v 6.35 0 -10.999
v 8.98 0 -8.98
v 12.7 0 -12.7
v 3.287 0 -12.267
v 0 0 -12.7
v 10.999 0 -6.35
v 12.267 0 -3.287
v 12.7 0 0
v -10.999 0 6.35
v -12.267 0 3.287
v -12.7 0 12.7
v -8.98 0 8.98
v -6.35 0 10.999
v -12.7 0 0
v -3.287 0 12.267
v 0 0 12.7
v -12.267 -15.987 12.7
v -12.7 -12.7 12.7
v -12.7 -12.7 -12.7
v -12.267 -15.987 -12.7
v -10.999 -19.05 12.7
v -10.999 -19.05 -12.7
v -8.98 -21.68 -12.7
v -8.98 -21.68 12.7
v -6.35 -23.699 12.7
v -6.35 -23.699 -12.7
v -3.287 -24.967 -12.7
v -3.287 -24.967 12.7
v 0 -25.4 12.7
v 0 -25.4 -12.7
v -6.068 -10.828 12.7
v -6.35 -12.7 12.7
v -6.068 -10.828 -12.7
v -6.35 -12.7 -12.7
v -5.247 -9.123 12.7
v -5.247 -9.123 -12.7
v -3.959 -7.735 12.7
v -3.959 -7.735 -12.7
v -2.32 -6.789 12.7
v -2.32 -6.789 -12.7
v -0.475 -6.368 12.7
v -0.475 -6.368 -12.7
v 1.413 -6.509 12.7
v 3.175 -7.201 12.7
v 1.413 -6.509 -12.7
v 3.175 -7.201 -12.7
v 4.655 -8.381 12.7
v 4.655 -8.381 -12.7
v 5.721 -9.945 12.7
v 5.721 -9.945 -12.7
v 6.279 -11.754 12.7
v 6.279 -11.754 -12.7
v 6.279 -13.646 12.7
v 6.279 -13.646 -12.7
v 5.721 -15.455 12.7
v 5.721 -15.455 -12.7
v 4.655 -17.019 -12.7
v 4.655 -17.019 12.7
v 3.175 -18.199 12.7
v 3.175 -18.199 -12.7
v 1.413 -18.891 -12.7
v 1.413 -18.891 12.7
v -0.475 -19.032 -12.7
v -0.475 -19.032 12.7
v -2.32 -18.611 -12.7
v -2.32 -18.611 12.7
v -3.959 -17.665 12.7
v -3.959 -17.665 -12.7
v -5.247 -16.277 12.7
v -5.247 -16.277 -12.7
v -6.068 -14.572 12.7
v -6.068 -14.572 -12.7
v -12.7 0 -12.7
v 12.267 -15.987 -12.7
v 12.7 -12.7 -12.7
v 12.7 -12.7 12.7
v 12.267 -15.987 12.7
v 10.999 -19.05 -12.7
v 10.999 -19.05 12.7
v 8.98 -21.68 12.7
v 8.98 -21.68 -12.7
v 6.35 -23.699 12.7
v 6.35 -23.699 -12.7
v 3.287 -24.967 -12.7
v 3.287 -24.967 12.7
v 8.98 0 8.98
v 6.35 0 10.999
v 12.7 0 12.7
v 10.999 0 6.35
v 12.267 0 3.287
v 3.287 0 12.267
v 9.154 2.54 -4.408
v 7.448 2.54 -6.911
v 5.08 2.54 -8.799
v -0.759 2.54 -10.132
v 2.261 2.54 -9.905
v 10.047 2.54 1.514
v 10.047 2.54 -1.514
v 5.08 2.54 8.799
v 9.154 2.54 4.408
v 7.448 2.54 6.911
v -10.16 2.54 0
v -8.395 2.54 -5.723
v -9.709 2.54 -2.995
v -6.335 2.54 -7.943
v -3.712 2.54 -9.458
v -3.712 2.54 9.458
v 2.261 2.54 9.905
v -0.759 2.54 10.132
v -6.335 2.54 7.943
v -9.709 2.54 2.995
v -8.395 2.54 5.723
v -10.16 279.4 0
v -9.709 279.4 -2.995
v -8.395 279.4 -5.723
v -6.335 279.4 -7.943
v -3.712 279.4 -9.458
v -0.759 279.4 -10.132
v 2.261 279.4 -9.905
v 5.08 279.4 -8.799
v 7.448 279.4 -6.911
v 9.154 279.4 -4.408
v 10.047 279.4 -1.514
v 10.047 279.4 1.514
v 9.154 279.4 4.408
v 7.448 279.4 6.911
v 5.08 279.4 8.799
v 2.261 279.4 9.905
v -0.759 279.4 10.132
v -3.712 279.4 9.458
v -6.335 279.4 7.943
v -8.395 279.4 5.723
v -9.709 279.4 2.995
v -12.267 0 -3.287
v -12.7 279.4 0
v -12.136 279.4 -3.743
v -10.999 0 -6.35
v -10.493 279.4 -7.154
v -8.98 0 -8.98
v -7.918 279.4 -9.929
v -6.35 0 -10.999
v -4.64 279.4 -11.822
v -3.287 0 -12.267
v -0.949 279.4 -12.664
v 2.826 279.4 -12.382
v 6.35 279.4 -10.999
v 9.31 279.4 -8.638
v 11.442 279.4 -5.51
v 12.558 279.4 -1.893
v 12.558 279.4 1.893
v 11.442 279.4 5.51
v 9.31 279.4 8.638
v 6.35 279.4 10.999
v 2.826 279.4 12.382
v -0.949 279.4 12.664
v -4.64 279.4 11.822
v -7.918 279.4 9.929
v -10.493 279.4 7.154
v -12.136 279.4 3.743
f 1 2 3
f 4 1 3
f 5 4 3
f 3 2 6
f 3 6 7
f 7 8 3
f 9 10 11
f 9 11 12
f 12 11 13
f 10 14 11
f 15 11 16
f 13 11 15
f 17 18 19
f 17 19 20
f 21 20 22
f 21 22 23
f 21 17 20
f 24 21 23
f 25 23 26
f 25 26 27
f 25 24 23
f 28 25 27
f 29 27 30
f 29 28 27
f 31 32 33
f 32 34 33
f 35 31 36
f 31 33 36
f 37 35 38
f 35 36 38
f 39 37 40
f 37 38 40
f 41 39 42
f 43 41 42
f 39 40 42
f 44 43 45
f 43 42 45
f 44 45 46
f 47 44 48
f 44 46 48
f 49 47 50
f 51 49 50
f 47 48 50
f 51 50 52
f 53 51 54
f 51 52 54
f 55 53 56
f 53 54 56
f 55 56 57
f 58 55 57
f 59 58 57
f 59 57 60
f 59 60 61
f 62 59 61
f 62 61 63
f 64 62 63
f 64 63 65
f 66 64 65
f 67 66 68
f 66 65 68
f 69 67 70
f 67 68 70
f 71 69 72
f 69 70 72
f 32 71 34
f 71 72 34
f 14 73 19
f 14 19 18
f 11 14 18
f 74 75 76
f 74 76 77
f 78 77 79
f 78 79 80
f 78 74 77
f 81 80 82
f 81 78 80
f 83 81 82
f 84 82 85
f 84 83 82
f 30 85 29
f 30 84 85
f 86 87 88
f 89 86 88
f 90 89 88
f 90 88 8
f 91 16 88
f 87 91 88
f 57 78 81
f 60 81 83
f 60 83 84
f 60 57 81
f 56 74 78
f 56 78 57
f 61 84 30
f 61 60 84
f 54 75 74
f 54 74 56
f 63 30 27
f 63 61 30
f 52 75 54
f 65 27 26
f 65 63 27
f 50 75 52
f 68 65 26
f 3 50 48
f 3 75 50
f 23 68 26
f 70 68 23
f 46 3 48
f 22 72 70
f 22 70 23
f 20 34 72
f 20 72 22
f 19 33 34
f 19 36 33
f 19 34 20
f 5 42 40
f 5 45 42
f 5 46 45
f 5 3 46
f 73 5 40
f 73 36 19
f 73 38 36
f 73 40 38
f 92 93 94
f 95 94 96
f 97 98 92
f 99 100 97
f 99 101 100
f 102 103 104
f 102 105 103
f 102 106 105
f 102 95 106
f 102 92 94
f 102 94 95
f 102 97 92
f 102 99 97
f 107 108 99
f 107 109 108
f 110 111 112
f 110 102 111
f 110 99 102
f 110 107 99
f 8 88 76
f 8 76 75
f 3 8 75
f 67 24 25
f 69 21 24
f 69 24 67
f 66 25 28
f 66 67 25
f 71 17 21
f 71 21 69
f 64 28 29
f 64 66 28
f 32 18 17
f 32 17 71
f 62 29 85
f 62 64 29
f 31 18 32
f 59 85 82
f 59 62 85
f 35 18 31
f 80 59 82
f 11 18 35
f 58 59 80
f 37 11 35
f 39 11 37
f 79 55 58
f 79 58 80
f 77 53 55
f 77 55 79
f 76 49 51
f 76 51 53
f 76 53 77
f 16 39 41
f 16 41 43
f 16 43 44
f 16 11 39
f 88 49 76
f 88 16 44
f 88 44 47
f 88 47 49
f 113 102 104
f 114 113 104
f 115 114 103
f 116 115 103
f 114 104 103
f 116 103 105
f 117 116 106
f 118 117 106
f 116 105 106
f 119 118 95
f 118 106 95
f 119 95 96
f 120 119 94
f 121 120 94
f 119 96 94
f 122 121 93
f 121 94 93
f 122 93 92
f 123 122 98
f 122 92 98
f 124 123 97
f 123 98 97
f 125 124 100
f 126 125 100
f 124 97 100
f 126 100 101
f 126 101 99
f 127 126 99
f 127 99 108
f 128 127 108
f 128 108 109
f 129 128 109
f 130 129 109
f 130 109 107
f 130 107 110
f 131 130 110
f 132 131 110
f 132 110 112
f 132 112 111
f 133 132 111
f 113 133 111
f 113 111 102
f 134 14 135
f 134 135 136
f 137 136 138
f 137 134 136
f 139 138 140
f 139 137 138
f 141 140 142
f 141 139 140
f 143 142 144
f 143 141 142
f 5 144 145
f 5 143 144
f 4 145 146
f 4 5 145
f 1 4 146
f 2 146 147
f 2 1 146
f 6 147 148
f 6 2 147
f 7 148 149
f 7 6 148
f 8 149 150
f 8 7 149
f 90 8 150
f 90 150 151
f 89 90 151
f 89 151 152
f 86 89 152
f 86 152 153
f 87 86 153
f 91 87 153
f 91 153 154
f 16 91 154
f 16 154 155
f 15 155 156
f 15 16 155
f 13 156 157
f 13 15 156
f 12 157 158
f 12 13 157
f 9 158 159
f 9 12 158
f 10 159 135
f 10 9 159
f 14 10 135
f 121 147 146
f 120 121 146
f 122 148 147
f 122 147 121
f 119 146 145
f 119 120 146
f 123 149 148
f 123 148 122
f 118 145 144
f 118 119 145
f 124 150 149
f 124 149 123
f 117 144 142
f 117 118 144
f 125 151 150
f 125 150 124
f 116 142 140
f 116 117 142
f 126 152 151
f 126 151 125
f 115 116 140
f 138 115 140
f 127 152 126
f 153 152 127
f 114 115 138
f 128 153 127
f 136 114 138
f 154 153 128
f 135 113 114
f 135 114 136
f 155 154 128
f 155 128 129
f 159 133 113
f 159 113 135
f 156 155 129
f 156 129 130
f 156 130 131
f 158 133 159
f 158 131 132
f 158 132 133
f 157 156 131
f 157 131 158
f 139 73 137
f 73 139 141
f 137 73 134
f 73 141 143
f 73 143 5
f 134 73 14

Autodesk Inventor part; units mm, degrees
ref_plane "YZ Plane" through (0, 0, 0) normal (1, 0, 0) x (0, 1, 0)
ref_plane "XZ Plane" through (0, 0, 0) normal (0, 1, 0) x (-1, 0, 0)
ref_plane "XY Plane" through (0, 0, 0) normal (0, 0, 1) x (1, 0, 0)
sketch "Sketch1" plane through (0, 0, 0) normal (0, 1, 0) x (-1, 0, 0)
  circle A0 centre (0, 0) radius 12.7
  dimension "d0" = 25.4
extrude "Extrusion1" add sketch "Sketch1" along normal blind 279.4
shell "Shell1" thickness 2.54 removed faces 1 at (3.6254, 279.4, -0.9542)
sketch "Sketch2" plane through (0, 0, 0) normal (0, -1, 0) x (1, 0, 0)
  line L0 (-12.7, 12.7) -> (12.7, 12.7)
  line L1 (12.7, 12.7) -> (12.7, -12.7)
  line L2 (12.7, -12.7) -> (-12.7, -12.7)
  line L3 (-12.7, -12.7) -> (-12.7, 12.7)
  point P0 (0, 0)
  point P1 (0, 0)
  dimension "d5" = 25.4
  dimension "d6" = 25.4
extrude "Extrusion2" add sketch "Sketch2" along normal blind 25.4
sketch "Sketch3" plane through (12.7, 0, -12.7) normal (0, 0, -1) x (-1, 0, 0)
  line L0 (0, 0) -> (0, -25.4) projected
  line L1 (25.4, 0) -> (25.4, -25.4) projected
  circle A0 centre (12.7, -12.7) radius 6.35
  point P0 (12.7, 0)
  dimension "d9" = 12.7
extrude "Extrusion3" cut sketch "Sketch3" against normal blind 33.3375
fillet "Fillet1" radius 12.7 2 edges at (12.7, -25.4, 0) (-12.7, -25.4, 0)
properties part number "ElevatorCylinderOuter"
